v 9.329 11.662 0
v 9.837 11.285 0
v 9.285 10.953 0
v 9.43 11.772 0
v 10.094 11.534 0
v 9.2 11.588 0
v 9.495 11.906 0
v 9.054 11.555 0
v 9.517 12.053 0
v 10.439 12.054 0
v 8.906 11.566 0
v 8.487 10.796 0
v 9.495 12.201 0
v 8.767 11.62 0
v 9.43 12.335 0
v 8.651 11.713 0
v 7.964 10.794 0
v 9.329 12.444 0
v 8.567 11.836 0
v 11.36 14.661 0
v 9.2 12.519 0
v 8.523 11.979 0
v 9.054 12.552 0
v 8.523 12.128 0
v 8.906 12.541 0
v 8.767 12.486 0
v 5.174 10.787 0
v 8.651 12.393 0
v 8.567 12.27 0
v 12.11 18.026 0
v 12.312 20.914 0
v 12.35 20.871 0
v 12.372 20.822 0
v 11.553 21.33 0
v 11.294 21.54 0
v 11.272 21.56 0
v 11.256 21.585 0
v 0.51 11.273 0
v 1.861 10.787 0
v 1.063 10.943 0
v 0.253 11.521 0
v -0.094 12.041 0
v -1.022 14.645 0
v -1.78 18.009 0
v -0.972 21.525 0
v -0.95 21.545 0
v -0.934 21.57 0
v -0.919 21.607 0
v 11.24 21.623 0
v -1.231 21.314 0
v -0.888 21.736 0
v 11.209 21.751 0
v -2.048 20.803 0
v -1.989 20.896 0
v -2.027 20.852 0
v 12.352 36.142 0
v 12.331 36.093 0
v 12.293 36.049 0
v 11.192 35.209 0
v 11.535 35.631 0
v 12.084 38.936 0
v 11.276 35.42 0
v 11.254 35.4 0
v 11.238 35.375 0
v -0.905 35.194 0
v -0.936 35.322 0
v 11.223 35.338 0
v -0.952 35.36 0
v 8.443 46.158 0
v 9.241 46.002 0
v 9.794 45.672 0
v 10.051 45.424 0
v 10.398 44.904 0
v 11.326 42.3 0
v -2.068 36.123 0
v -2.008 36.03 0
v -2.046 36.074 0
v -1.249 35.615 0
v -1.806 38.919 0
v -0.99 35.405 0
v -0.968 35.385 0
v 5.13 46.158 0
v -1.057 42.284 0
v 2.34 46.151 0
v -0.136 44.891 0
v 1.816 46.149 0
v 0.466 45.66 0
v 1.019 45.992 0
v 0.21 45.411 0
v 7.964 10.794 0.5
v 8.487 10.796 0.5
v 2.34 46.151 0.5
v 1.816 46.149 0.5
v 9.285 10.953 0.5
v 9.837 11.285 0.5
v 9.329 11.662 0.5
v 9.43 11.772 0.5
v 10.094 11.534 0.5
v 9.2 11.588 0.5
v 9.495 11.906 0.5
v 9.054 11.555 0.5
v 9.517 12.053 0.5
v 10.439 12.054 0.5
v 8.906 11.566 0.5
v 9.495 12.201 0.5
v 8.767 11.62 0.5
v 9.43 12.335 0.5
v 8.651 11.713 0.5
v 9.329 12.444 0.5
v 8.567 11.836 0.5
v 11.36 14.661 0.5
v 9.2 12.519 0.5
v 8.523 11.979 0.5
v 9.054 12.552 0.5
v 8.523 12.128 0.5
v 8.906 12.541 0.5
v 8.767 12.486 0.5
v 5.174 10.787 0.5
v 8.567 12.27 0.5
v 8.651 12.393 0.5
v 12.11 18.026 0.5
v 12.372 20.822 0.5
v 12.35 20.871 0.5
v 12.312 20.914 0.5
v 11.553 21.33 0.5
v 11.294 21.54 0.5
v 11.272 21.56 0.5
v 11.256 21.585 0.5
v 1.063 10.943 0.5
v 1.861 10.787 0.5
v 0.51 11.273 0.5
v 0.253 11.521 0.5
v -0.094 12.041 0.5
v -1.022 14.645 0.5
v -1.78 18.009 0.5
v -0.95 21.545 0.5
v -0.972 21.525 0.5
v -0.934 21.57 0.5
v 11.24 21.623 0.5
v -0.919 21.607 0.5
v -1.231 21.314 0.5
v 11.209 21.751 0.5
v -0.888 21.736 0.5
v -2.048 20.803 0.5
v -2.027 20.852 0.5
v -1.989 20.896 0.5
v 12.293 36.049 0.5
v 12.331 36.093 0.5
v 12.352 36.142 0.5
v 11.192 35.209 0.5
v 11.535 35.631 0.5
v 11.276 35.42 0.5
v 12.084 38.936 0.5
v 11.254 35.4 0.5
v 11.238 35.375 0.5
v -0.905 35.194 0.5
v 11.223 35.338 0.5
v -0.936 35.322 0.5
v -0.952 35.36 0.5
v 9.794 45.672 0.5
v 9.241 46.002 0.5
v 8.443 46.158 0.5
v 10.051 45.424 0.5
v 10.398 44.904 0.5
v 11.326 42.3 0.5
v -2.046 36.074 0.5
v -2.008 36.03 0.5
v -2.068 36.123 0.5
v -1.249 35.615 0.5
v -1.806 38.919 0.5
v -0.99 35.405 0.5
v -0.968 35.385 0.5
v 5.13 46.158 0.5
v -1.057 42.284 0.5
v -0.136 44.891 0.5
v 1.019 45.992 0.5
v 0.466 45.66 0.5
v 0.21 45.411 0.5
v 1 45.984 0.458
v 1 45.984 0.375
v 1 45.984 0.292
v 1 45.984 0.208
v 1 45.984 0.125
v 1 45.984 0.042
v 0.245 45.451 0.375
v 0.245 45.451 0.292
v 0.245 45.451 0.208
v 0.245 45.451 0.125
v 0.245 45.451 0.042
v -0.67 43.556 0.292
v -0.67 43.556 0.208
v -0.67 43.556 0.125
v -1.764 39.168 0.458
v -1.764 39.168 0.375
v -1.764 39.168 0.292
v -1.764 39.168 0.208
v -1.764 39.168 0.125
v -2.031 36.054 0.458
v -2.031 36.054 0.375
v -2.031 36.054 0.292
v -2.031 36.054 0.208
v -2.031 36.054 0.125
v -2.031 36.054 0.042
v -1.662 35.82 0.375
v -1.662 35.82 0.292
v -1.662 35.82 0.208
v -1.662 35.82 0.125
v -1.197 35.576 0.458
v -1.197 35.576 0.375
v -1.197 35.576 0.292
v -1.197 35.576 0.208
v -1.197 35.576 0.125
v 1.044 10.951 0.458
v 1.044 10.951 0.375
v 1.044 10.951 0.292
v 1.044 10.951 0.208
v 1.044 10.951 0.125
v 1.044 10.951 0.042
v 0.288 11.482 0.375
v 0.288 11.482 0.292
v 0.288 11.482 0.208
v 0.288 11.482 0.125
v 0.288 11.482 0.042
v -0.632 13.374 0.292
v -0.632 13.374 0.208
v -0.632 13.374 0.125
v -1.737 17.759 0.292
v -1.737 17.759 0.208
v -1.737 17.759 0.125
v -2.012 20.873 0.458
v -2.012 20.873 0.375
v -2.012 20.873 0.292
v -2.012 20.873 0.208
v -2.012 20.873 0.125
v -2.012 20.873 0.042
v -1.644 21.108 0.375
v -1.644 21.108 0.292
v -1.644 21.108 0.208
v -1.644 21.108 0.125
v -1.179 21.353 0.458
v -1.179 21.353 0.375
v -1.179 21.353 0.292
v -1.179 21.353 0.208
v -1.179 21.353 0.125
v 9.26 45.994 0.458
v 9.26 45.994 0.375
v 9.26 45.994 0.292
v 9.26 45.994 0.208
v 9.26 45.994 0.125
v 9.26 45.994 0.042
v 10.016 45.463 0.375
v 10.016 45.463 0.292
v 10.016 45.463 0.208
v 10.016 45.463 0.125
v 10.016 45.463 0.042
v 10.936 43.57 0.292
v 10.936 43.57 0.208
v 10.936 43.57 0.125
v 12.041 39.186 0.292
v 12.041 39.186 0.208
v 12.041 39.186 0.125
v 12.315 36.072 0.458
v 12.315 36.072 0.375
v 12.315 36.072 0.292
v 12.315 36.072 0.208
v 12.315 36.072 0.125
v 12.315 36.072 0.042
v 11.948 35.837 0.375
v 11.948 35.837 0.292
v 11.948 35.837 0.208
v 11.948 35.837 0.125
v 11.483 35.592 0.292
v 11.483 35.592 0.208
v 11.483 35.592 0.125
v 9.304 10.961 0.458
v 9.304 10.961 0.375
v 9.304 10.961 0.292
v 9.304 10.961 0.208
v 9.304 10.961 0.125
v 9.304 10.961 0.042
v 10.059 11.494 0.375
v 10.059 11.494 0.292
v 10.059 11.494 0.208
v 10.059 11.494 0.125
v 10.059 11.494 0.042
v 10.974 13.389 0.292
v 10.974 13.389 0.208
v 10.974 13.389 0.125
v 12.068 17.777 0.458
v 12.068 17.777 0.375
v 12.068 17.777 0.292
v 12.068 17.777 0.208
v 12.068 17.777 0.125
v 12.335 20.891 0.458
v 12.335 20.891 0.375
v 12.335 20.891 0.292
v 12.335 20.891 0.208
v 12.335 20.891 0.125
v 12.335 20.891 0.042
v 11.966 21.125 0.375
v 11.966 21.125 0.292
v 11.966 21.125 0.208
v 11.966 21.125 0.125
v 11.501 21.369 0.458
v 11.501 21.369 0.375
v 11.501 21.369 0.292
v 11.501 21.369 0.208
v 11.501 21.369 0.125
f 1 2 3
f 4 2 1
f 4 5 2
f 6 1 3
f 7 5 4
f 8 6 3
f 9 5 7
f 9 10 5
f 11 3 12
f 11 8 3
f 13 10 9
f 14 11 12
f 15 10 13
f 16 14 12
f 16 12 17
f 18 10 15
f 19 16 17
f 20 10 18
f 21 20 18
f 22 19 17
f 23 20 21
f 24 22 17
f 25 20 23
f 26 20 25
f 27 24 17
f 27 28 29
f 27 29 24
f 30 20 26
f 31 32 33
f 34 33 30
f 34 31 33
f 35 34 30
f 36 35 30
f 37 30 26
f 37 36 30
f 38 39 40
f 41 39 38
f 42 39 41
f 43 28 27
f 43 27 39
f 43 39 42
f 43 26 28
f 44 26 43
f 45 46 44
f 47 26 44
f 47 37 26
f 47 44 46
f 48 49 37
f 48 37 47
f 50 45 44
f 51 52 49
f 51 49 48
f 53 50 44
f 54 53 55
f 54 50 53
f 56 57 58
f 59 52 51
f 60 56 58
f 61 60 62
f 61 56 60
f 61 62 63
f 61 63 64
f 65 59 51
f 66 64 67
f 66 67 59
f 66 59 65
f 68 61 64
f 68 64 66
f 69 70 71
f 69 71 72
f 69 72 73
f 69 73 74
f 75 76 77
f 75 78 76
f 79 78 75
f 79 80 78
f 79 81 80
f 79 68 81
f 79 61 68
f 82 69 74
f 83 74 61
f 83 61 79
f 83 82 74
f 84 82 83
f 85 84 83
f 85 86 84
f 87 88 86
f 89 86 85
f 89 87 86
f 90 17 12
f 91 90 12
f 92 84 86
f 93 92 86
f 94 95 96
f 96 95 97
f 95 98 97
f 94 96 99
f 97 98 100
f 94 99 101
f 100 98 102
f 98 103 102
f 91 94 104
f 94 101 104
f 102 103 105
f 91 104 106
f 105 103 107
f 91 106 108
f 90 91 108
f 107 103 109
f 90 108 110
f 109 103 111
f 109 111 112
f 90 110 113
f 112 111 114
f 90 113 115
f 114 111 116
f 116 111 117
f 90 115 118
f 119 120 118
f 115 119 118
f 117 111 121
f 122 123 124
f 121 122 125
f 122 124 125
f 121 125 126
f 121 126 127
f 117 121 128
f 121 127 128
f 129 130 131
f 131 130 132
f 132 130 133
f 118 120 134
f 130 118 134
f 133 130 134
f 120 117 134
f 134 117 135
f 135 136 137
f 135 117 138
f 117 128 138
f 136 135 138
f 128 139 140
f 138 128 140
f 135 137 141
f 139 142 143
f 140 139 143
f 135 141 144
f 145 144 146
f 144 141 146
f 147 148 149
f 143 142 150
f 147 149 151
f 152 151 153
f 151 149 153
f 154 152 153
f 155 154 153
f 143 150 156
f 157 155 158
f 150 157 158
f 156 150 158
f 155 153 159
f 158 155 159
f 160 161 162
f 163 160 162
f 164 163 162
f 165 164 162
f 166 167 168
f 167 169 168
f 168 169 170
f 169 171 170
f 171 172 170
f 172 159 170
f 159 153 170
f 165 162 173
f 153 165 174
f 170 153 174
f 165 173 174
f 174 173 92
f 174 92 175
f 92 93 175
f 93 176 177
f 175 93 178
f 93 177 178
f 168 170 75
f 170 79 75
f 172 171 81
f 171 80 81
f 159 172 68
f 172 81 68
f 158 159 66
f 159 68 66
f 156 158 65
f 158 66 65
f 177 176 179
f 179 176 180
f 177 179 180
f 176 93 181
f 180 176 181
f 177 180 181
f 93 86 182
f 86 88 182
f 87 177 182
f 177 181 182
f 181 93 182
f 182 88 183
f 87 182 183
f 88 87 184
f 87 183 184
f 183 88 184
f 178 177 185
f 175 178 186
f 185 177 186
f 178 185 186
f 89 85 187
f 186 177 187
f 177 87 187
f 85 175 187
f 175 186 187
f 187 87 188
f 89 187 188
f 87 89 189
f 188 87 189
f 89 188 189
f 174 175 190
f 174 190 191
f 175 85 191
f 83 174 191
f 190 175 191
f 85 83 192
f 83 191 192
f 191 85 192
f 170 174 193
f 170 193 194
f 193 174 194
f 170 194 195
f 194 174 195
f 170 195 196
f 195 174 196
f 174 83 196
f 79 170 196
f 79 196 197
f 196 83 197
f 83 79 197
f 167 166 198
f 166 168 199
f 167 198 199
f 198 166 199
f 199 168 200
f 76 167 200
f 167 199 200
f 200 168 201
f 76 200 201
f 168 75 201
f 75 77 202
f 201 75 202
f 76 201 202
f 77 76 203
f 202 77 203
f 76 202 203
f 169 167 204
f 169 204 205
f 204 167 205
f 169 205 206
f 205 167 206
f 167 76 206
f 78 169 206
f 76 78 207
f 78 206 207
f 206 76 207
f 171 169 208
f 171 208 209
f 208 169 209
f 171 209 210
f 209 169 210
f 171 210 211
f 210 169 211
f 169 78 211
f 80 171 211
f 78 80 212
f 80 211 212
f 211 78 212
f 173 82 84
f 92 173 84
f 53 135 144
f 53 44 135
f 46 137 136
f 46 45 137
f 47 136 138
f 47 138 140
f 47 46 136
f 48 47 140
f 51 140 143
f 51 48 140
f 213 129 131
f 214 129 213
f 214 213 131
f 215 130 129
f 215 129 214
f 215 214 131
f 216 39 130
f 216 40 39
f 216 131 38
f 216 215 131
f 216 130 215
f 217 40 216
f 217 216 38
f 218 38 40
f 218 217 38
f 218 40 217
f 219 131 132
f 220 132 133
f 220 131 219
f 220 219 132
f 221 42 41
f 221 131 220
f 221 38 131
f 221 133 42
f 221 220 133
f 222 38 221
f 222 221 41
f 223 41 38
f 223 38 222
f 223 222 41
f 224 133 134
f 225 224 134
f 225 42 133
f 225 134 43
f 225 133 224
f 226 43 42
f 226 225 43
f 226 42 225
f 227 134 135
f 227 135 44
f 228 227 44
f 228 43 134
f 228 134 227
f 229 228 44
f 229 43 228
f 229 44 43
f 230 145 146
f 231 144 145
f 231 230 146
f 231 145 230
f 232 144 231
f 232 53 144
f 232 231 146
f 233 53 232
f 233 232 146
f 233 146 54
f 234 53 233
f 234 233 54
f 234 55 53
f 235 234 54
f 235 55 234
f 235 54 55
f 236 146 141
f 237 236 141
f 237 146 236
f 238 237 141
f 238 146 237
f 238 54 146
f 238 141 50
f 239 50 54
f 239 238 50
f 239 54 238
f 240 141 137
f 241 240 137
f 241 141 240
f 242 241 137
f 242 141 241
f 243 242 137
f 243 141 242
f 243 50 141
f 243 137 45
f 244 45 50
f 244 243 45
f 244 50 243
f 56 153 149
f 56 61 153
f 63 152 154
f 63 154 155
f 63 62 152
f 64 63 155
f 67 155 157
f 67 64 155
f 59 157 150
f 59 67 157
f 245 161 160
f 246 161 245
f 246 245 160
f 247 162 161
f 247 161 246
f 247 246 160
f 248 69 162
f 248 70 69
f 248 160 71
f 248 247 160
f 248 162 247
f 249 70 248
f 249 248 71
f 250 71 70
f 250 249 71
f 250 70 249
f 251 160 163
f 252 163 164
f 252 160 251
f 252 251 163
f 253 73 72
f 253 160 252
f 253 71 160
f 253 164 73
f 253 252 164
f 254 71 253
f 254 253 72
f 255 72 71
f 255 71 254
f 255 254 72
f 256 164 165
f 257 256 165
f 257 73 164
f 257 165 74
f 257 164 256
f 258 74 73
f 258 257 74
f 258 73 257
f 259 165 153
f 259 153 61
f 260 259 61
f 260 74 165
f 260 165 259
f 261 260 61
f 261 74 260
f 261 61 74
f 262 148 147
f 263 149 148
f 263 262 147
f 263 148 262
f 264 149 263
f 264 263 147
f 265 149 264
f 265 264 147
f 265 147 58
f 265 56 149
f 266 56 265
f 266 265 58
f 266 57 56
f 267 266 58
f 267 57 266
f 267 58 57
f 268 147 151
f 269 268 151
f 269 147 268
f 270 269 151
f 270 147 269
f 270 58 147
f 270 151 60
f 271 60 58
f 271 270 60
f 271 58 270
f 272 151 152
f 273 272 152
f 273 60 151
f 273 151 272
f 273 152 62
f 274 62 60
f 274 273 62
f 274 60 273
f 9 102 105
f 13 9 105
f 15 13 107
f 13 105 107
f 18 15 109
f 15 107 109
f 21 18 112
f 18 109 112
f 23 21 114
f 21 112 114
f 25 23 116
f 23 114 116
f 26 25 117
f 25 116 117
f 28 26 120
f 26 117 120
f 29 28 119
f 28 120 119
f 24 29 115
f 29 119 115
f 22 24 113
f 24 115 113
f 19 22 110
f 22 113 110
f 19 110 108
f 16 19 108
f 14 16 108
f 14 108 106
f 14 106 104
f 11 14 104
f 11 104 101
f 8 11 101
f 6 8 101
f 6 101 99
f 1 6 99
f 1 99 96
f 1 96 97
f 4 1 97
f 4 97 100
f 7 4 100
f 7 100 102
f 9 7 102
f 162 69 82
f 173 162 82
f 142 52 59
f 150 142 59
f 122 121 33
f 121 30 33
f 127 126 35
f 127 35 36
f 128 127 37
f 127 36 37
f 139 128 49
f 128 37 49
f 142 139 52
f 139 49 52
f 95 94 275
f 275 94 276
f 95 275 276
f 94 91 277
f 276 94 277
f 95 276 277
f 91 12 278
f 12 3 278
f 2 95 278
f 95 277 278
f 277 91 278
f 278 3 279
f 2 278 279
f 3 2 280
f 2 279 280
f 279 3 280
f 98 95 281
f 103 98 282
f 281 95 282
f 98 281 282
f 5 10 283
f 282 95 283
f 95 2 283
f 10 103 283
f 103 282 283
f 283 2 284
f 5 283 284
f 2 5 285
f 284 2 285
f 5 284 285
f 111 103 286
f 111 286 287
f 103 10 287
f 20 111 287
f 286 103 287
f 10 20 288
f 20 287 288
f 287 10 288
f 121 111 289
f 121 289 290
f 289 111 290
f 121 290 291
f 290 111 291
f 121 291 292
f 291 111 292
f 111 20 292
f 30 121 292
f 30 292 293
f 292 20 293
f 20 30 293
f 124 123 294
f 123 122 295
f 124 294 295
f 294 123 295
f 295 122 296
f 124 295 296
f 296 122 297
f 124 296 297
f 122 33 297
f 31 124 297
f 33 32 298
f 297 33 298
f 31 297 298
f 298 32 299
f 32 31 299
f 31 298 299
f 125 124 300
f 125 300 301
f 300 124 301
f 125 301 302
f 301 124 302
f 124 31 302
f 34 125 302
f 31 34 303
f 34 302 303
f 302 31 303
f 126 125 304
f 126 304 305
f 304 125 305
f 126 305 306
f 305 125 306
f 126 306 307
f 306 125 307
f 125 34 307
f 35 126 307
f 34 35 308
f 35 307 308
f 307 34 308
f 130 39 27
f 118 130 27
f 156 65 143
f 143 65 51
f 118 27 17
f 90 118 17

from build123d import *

# Parameters (mm, degrees)
F1_DEPTH = 0.5
F2_R     = 0.5
F3_DEPTH = 25


with BuildPart() as f1:
    # F0 (on Top) → F1 (new body)
    with BuildSketch(Plane.XY):
        with BuildLine():
            add(Edge.make_bspline(
                [(8.4428153932, 46.1577735841), (8.9348866368, 46.0957848403), (9.1902084572, 46.063620605), (10.2136533947, 45.482421242), (11.0515898848, 43.4474753339), (12.1103981, 39.4594863885), (12.4151111507, 36.3633669949), (12.340186084, 36.0679246479), (12.165975669, 35.9602462388), (11.9507020497, 35.8303573833), (11.6789376951, 35.7187516393), (11.4838684771, 35.6089894059), (11.2951492349, 35.402465646), (11.2299108219, 35.4186188516), (11.1919697374, 35.2088660002)],
                knots=[0, 0, 0, 0, 0.0587180961, 0.1205420114, 0.2138591133, 0.3506444227, 0.4605887666, 0.4905820957, 0.5177770546, 0.5504776042, 0.5852649664, 0.6163716927, 0.6468395023, 0.6799505505, 0.6799505505, 0.6799505505, 0.6799505505], degree=3))
            Line((8.4428153932, 46.1577735841), (7.9196737637, 46.1577735841))
            add(Edge.make_bspline(
                [(10.6898430557, 28.479457974), (10.2008874142, 35.3660491094), (9.3819124933, 45.0954346997), (7.9196737637, 46.1577735841)],
                knots=[0.7815795169, 0.7815795169, 0.7815795169, 0.7815795169, 0.988282322, 0.988282322, 0.988282322, 0.988282322], degree=3))
            add(Edge.make_bspline(
                [(11.1919697374, 35.2088660002), (11.0755157617, 34.5650638059), (10.9217010225, 31.865964087), (10.6898430557, 28.479457974)],
                knots=[0.6799505505, 0.6799505505, 0.6799505505, 0.6799505505, 0.7815795169, 0.7815795169, 0.7815795169, 0.7815795169], degree=3))
        make_face()
        with BuildLine():
            Line((11.2089504357, 21.7513385402), (11.1919697374, 35.2088660002))
            add(Edge.make_bspline(
                [(11.1919697374, 35.2088660002), (11.0755157617, 34.5650638059), (10.9217010225, 31.865964087), (10.6898430557, 28.479457974)],
                knots=[0.6799505505, 0.6799505505, 0.6799505505, 0.6799505505, 0.7815795169, 0.7815795169, 0.7815795169, 0.7815795169], degree=3))
            add(Edge.make_bspline(
                [(11.2089504357, 21.7513385402), (11.0908721351, 22.3948448019), (10.9302464525, 25.0935477601), (10.6898430557, 28.479457974)],
                knots=[0.6799505505, 0.6799505505, 0.6799505505, 0.6799505505, 0.7815795169, 0.7815795169, 0.7815795169, 0.7815795169], degree=3))
        make_face()
        with BuildLine():
            add(Edge.make_bspline(
                [(10.6898430557, 28.479457974), (10.2008874142, 35.3660491094), (9.3819124933, 45.0954346997), (7.9196737637, 46.1577735841)],
                knots=[0.7815795169, 0.7815795169, 0.7815795169, 0.7815795169, 0.988282322, 0.988282322, 0.988282322, 0.988282322], degree=3))
            Line((7.9196737637, 46.1577735841), (5.1296291058, 46.1577735841))
            Line((5.1296291058, 46.1577735841), (2.3395933321, 46.1507326427))
            add(Edge.make_bspline(
                [(-0.3859542385, 28.4654825411), (0.0856208824, 35.3532856734), (0.8800401713, 45.0847070435), (2.3395933321, 46.1507326427)],
                knots=[0.7815795169, 0.7815795169, 0.7815795169, 0.7815795169, 0.988282322, 0.988282322, 0.988282322, 0.988282322], degree=3))
            add(Edge.make_bspline(
                [(-0.3859542385, 28.4654825411), (0.103001403, 21.5788914057), (0.9219763239, 11.8495058153), (2.3842150534, 10.787166931)],
                knots=[0.7815795169, 0.7815795169, 0.7815795169, 0.7815795169, 0.988282322, 0.988282322, 0.988282322, 0.988282322], degree=3))
            Line((2.3842150534, 10.787166931), (5.1742597114, 10.787166931))
            Line((5.1742597114, 10.787166931), (7.9642954851, 10.7942078724))
            add(Edge.make_bspline(
                [(10.6898430557, 28.479457974), (10.2182679348, 21.5916548416), (9.4238486459, 11.8602334716), (7.9642954851, 10.7942078724)],
                knots=[0.7815795169, 0.7815795169, 0.7815795169, 0.7815795169, 0.988282322, 0.988282322, 0.988282322, 0.988282322], degree=3))
        make_face()
        with BuildLine():
            add(Edge.make_bspline(
                [(11.2089504357, 21.7513385402), (11.0908721351, 22.3948448019), (10.9302464525, 25.0935477601), (10.6898430557, 28.479457974)],
                knots=[0.6799505505, 0.6799505505, 0.6799505505, 0.6799505505, 0.7815795169, 0.7815795169, 0.7815795169, 0.7815795169], degree=3))
            add(Edge.make_bspline(
                [(10.6898430557, 28.479457974), (10.2182679348, 21.5916548416), (9.4238486459, 11.8602334716), (7.9642954851, 10.7942078724)],
                knots=[0.7815795169, 0.7815795169, 0.7815795169, 0.7815795169, 0.988282322, 0.988282322, 0.988282322, 0.988282322], degree=3))
            Line((7.9642954851, 10.7942078724), (8.4874354488, 10.7955280697))
            add(Edge.make_bspline(
                [(8.4874354488, 10.7955280697), (8.979348691, 10.8587584044), (9.2345885289, 10.8915668661), (10.2565634959, 11.4753471384), (11.0893619395, 13.5124011787), (12.1381027161, 17.5030494278), (12.4350014466, 20.5999279348), (12.3593310418, 20.8951802605), (12.1848494448, 21.0024186902), (11.9692487242, 21.1317638688), (11.6972035874, 21.2426834344), (11.5018579952, 21.3519530427), (11.3126181717, 21.5579998941), (11.2474207306, 21.5416821046), (11.2089504357, 21.7513385402)],
                knots=[0, 0, 0, 0, 0.0587180961, 0.1205420114, 0.2138591133, 0.3506444227, 0.4605887666, 0.4905820957, 0.5177770546, 0.5504776042, 0.5852649664, 0.6163716927, 0.6468395023, 0.6799505505, 0.6799505505, 0.6799505505, 0.6799505505], degree=3))
        make_face()
        with BuildLine():
            add(Edge.make_bspline(
                [(-0.3859542385, 28.4654825411), (0.0856208824, 35.3532856734), (0.8800401713, 45.0847070435), (2.3395933321, 46.1507326427)],
                knots=[0.7815795169, 0.7815795169, 0.7815795169, 0.7815795169, 0.988282322, 0.988282322, 0.988282322, 0.988282322], degree=3))
            Line((2.3395933321, 46.1507326427), (1.8164533684, 46.1494124454))
            add(Edge.make_bspline(
                [(1.8164533684, 46.1494124454), (1.3245401262, 46.0861821106), (1.0693002883, 46.053373649), (0.0473253212, 45.4695933766), (-0.7854731224, 43.4325393364), (-1.834213899, 39.4418910872), (-2.1311126294, 36.3450125803), (-2.0554422246, 36.0497602546), (-1.8809606277, 35.9425218249), (-1.6653599071, 35.8131766463), (-1.3933147702, 35.7022570807), (-1.197969178, 35.5929874724), (-1.0087293545, 35.3869406209), (-0.9435319134, 35.4032584105), (-0.9050616186, 35.1936019748)],
                knots=[0, 0, 0, 0, 0.0587180961, 0.1205420114, 0.2138591133, 0.3506444227, 0.4605887666, 0.4905820957, 0.5177770546, 0.5504776042, 0.5852649664, 0.6163716927, 0.6468395023, 0.6799505505, 0.6799505505, 0.6799505505, 0.6799505505], degree=3))
            add(Edge.make_bspline(
                [(-0.9050616186, 35.1936019748), (-0.7869833179, 34.5500957132), (-0.6263576353, 31.851392755), (-0.3859542385, 28.4654825411)],
                knots=[0.6799505505, 0.6799505505, 0.6799505505, 0.6799505505, 0.7815795169, 0.7815795169, 0.7815795169, 0.7815795169], degree=3))
        make_face()
        with BuildLine():
            add(Edge.make_bspline(
                [(-0.8880809202, 21.7360745149), (-0.7716269445, 22.3798767092), (-0.6178122053, 25.0789764281), (-0.3859542385, 28.4654825411)],
                knots=[0.6799505505, 0.6799505505, 0.6799505505, 0.6799505505, 0.7815795169, 0.7815795169, 0.7815795169, 0.7815795169], degree=3))
            add(Edge.make_bspline(
                [(-0.9050616186, 35.1936019748), (-0.7869833179, 34.5500957132), (-0.6263576353, 31.851392755), (-0.3859542385, 28.4654825411)],
                knots=[0.6799505505, 0.6799505505, 0.6799505505, 0.6799505505, 0.7815795169, 0.7815795169, 0.7815795169, 0.7815795169], degree=3))
            Line((-0.9050616186, 35.1936019748), (-0.8880809202, 21.7360745149))
        make_face()
        with BuildLine():
            add(Edge.make_bspline(
                [(-0.3859542385, 28.4654825411), (0.103001403, 21.5788914057), (0.9219763239, 11.8495058153), (2.3842150534, 10.787166931)],
                knots=[0.7815795169, 0.7815795169, 0.7815795169, 0.7815795169, 0.988282322, 0.988282322, 0.988282322, 0.988282322], degree=3))
            add(Edge.make_bspline(
                [(-0.8880809202, 21.7360745149), (-0.7716269445, 22.3798767092), (-0.6178122053, 25.0789764281), (-0.3859542385, 28.4654825411)],
                knots=[0.6799505505, 0.6799505505, 0.6799505505, 0.6799505505, 0.7815795169, 0.7815795169, 0.7815795169, 0.7815795169], degree=3))
            add(Edge.make_bspline(
                [(1.861073424, 10.787166931), (1.3690021804, 10.8491556748), (1.11368036, 10.8813199101), (0.0902354225, 11.4625192731), (-0.7477010677, 13.4974651812), (-1.8065092829, 17.4854541266), (-2.1112223335, 20.5815735202), (-2.0362972668, 20.8770158672), (-1.8620868518, 20.9846942763), (-1.6468132325, 21.1145831317), (-1.375048878, 21.2261888758), (-1.1799796599, 21.3359511092), (-0.9912604178, 21.5424748691), (-0.9260220048, 21.5263216634), (-0.8880809202, 21.7360745149)],
                knots=[0, 0, 0, 0, 0.0587180961, 0.1205420114, 0.2138591133, 0.3506444227, 0.4605887666, 0.4905820957, 0.5177770546, 0.5504776042, 0.5852649664, 0.6163716927, 0.6468395023, 0.6799505505, 0.6799505505, 0.6799505505, 0.6799505505], degree=3))
            Line((1.861073424, 10.787166931), (2.3842150534, 10.787166931))
        make_face()
    extrude(amount=F1_DEPTH)

    # F2 (on face) → F3 (cut)
    with BuildSketch(Plane.XY.offset(0.5)):
        with Locations((9.0170297772, 12.0532298461)):
            Circle(F2_R)
    extrude(amount=-F3_DEPTH, mode=Mode.SUBTRACT)


solid = f1.part
